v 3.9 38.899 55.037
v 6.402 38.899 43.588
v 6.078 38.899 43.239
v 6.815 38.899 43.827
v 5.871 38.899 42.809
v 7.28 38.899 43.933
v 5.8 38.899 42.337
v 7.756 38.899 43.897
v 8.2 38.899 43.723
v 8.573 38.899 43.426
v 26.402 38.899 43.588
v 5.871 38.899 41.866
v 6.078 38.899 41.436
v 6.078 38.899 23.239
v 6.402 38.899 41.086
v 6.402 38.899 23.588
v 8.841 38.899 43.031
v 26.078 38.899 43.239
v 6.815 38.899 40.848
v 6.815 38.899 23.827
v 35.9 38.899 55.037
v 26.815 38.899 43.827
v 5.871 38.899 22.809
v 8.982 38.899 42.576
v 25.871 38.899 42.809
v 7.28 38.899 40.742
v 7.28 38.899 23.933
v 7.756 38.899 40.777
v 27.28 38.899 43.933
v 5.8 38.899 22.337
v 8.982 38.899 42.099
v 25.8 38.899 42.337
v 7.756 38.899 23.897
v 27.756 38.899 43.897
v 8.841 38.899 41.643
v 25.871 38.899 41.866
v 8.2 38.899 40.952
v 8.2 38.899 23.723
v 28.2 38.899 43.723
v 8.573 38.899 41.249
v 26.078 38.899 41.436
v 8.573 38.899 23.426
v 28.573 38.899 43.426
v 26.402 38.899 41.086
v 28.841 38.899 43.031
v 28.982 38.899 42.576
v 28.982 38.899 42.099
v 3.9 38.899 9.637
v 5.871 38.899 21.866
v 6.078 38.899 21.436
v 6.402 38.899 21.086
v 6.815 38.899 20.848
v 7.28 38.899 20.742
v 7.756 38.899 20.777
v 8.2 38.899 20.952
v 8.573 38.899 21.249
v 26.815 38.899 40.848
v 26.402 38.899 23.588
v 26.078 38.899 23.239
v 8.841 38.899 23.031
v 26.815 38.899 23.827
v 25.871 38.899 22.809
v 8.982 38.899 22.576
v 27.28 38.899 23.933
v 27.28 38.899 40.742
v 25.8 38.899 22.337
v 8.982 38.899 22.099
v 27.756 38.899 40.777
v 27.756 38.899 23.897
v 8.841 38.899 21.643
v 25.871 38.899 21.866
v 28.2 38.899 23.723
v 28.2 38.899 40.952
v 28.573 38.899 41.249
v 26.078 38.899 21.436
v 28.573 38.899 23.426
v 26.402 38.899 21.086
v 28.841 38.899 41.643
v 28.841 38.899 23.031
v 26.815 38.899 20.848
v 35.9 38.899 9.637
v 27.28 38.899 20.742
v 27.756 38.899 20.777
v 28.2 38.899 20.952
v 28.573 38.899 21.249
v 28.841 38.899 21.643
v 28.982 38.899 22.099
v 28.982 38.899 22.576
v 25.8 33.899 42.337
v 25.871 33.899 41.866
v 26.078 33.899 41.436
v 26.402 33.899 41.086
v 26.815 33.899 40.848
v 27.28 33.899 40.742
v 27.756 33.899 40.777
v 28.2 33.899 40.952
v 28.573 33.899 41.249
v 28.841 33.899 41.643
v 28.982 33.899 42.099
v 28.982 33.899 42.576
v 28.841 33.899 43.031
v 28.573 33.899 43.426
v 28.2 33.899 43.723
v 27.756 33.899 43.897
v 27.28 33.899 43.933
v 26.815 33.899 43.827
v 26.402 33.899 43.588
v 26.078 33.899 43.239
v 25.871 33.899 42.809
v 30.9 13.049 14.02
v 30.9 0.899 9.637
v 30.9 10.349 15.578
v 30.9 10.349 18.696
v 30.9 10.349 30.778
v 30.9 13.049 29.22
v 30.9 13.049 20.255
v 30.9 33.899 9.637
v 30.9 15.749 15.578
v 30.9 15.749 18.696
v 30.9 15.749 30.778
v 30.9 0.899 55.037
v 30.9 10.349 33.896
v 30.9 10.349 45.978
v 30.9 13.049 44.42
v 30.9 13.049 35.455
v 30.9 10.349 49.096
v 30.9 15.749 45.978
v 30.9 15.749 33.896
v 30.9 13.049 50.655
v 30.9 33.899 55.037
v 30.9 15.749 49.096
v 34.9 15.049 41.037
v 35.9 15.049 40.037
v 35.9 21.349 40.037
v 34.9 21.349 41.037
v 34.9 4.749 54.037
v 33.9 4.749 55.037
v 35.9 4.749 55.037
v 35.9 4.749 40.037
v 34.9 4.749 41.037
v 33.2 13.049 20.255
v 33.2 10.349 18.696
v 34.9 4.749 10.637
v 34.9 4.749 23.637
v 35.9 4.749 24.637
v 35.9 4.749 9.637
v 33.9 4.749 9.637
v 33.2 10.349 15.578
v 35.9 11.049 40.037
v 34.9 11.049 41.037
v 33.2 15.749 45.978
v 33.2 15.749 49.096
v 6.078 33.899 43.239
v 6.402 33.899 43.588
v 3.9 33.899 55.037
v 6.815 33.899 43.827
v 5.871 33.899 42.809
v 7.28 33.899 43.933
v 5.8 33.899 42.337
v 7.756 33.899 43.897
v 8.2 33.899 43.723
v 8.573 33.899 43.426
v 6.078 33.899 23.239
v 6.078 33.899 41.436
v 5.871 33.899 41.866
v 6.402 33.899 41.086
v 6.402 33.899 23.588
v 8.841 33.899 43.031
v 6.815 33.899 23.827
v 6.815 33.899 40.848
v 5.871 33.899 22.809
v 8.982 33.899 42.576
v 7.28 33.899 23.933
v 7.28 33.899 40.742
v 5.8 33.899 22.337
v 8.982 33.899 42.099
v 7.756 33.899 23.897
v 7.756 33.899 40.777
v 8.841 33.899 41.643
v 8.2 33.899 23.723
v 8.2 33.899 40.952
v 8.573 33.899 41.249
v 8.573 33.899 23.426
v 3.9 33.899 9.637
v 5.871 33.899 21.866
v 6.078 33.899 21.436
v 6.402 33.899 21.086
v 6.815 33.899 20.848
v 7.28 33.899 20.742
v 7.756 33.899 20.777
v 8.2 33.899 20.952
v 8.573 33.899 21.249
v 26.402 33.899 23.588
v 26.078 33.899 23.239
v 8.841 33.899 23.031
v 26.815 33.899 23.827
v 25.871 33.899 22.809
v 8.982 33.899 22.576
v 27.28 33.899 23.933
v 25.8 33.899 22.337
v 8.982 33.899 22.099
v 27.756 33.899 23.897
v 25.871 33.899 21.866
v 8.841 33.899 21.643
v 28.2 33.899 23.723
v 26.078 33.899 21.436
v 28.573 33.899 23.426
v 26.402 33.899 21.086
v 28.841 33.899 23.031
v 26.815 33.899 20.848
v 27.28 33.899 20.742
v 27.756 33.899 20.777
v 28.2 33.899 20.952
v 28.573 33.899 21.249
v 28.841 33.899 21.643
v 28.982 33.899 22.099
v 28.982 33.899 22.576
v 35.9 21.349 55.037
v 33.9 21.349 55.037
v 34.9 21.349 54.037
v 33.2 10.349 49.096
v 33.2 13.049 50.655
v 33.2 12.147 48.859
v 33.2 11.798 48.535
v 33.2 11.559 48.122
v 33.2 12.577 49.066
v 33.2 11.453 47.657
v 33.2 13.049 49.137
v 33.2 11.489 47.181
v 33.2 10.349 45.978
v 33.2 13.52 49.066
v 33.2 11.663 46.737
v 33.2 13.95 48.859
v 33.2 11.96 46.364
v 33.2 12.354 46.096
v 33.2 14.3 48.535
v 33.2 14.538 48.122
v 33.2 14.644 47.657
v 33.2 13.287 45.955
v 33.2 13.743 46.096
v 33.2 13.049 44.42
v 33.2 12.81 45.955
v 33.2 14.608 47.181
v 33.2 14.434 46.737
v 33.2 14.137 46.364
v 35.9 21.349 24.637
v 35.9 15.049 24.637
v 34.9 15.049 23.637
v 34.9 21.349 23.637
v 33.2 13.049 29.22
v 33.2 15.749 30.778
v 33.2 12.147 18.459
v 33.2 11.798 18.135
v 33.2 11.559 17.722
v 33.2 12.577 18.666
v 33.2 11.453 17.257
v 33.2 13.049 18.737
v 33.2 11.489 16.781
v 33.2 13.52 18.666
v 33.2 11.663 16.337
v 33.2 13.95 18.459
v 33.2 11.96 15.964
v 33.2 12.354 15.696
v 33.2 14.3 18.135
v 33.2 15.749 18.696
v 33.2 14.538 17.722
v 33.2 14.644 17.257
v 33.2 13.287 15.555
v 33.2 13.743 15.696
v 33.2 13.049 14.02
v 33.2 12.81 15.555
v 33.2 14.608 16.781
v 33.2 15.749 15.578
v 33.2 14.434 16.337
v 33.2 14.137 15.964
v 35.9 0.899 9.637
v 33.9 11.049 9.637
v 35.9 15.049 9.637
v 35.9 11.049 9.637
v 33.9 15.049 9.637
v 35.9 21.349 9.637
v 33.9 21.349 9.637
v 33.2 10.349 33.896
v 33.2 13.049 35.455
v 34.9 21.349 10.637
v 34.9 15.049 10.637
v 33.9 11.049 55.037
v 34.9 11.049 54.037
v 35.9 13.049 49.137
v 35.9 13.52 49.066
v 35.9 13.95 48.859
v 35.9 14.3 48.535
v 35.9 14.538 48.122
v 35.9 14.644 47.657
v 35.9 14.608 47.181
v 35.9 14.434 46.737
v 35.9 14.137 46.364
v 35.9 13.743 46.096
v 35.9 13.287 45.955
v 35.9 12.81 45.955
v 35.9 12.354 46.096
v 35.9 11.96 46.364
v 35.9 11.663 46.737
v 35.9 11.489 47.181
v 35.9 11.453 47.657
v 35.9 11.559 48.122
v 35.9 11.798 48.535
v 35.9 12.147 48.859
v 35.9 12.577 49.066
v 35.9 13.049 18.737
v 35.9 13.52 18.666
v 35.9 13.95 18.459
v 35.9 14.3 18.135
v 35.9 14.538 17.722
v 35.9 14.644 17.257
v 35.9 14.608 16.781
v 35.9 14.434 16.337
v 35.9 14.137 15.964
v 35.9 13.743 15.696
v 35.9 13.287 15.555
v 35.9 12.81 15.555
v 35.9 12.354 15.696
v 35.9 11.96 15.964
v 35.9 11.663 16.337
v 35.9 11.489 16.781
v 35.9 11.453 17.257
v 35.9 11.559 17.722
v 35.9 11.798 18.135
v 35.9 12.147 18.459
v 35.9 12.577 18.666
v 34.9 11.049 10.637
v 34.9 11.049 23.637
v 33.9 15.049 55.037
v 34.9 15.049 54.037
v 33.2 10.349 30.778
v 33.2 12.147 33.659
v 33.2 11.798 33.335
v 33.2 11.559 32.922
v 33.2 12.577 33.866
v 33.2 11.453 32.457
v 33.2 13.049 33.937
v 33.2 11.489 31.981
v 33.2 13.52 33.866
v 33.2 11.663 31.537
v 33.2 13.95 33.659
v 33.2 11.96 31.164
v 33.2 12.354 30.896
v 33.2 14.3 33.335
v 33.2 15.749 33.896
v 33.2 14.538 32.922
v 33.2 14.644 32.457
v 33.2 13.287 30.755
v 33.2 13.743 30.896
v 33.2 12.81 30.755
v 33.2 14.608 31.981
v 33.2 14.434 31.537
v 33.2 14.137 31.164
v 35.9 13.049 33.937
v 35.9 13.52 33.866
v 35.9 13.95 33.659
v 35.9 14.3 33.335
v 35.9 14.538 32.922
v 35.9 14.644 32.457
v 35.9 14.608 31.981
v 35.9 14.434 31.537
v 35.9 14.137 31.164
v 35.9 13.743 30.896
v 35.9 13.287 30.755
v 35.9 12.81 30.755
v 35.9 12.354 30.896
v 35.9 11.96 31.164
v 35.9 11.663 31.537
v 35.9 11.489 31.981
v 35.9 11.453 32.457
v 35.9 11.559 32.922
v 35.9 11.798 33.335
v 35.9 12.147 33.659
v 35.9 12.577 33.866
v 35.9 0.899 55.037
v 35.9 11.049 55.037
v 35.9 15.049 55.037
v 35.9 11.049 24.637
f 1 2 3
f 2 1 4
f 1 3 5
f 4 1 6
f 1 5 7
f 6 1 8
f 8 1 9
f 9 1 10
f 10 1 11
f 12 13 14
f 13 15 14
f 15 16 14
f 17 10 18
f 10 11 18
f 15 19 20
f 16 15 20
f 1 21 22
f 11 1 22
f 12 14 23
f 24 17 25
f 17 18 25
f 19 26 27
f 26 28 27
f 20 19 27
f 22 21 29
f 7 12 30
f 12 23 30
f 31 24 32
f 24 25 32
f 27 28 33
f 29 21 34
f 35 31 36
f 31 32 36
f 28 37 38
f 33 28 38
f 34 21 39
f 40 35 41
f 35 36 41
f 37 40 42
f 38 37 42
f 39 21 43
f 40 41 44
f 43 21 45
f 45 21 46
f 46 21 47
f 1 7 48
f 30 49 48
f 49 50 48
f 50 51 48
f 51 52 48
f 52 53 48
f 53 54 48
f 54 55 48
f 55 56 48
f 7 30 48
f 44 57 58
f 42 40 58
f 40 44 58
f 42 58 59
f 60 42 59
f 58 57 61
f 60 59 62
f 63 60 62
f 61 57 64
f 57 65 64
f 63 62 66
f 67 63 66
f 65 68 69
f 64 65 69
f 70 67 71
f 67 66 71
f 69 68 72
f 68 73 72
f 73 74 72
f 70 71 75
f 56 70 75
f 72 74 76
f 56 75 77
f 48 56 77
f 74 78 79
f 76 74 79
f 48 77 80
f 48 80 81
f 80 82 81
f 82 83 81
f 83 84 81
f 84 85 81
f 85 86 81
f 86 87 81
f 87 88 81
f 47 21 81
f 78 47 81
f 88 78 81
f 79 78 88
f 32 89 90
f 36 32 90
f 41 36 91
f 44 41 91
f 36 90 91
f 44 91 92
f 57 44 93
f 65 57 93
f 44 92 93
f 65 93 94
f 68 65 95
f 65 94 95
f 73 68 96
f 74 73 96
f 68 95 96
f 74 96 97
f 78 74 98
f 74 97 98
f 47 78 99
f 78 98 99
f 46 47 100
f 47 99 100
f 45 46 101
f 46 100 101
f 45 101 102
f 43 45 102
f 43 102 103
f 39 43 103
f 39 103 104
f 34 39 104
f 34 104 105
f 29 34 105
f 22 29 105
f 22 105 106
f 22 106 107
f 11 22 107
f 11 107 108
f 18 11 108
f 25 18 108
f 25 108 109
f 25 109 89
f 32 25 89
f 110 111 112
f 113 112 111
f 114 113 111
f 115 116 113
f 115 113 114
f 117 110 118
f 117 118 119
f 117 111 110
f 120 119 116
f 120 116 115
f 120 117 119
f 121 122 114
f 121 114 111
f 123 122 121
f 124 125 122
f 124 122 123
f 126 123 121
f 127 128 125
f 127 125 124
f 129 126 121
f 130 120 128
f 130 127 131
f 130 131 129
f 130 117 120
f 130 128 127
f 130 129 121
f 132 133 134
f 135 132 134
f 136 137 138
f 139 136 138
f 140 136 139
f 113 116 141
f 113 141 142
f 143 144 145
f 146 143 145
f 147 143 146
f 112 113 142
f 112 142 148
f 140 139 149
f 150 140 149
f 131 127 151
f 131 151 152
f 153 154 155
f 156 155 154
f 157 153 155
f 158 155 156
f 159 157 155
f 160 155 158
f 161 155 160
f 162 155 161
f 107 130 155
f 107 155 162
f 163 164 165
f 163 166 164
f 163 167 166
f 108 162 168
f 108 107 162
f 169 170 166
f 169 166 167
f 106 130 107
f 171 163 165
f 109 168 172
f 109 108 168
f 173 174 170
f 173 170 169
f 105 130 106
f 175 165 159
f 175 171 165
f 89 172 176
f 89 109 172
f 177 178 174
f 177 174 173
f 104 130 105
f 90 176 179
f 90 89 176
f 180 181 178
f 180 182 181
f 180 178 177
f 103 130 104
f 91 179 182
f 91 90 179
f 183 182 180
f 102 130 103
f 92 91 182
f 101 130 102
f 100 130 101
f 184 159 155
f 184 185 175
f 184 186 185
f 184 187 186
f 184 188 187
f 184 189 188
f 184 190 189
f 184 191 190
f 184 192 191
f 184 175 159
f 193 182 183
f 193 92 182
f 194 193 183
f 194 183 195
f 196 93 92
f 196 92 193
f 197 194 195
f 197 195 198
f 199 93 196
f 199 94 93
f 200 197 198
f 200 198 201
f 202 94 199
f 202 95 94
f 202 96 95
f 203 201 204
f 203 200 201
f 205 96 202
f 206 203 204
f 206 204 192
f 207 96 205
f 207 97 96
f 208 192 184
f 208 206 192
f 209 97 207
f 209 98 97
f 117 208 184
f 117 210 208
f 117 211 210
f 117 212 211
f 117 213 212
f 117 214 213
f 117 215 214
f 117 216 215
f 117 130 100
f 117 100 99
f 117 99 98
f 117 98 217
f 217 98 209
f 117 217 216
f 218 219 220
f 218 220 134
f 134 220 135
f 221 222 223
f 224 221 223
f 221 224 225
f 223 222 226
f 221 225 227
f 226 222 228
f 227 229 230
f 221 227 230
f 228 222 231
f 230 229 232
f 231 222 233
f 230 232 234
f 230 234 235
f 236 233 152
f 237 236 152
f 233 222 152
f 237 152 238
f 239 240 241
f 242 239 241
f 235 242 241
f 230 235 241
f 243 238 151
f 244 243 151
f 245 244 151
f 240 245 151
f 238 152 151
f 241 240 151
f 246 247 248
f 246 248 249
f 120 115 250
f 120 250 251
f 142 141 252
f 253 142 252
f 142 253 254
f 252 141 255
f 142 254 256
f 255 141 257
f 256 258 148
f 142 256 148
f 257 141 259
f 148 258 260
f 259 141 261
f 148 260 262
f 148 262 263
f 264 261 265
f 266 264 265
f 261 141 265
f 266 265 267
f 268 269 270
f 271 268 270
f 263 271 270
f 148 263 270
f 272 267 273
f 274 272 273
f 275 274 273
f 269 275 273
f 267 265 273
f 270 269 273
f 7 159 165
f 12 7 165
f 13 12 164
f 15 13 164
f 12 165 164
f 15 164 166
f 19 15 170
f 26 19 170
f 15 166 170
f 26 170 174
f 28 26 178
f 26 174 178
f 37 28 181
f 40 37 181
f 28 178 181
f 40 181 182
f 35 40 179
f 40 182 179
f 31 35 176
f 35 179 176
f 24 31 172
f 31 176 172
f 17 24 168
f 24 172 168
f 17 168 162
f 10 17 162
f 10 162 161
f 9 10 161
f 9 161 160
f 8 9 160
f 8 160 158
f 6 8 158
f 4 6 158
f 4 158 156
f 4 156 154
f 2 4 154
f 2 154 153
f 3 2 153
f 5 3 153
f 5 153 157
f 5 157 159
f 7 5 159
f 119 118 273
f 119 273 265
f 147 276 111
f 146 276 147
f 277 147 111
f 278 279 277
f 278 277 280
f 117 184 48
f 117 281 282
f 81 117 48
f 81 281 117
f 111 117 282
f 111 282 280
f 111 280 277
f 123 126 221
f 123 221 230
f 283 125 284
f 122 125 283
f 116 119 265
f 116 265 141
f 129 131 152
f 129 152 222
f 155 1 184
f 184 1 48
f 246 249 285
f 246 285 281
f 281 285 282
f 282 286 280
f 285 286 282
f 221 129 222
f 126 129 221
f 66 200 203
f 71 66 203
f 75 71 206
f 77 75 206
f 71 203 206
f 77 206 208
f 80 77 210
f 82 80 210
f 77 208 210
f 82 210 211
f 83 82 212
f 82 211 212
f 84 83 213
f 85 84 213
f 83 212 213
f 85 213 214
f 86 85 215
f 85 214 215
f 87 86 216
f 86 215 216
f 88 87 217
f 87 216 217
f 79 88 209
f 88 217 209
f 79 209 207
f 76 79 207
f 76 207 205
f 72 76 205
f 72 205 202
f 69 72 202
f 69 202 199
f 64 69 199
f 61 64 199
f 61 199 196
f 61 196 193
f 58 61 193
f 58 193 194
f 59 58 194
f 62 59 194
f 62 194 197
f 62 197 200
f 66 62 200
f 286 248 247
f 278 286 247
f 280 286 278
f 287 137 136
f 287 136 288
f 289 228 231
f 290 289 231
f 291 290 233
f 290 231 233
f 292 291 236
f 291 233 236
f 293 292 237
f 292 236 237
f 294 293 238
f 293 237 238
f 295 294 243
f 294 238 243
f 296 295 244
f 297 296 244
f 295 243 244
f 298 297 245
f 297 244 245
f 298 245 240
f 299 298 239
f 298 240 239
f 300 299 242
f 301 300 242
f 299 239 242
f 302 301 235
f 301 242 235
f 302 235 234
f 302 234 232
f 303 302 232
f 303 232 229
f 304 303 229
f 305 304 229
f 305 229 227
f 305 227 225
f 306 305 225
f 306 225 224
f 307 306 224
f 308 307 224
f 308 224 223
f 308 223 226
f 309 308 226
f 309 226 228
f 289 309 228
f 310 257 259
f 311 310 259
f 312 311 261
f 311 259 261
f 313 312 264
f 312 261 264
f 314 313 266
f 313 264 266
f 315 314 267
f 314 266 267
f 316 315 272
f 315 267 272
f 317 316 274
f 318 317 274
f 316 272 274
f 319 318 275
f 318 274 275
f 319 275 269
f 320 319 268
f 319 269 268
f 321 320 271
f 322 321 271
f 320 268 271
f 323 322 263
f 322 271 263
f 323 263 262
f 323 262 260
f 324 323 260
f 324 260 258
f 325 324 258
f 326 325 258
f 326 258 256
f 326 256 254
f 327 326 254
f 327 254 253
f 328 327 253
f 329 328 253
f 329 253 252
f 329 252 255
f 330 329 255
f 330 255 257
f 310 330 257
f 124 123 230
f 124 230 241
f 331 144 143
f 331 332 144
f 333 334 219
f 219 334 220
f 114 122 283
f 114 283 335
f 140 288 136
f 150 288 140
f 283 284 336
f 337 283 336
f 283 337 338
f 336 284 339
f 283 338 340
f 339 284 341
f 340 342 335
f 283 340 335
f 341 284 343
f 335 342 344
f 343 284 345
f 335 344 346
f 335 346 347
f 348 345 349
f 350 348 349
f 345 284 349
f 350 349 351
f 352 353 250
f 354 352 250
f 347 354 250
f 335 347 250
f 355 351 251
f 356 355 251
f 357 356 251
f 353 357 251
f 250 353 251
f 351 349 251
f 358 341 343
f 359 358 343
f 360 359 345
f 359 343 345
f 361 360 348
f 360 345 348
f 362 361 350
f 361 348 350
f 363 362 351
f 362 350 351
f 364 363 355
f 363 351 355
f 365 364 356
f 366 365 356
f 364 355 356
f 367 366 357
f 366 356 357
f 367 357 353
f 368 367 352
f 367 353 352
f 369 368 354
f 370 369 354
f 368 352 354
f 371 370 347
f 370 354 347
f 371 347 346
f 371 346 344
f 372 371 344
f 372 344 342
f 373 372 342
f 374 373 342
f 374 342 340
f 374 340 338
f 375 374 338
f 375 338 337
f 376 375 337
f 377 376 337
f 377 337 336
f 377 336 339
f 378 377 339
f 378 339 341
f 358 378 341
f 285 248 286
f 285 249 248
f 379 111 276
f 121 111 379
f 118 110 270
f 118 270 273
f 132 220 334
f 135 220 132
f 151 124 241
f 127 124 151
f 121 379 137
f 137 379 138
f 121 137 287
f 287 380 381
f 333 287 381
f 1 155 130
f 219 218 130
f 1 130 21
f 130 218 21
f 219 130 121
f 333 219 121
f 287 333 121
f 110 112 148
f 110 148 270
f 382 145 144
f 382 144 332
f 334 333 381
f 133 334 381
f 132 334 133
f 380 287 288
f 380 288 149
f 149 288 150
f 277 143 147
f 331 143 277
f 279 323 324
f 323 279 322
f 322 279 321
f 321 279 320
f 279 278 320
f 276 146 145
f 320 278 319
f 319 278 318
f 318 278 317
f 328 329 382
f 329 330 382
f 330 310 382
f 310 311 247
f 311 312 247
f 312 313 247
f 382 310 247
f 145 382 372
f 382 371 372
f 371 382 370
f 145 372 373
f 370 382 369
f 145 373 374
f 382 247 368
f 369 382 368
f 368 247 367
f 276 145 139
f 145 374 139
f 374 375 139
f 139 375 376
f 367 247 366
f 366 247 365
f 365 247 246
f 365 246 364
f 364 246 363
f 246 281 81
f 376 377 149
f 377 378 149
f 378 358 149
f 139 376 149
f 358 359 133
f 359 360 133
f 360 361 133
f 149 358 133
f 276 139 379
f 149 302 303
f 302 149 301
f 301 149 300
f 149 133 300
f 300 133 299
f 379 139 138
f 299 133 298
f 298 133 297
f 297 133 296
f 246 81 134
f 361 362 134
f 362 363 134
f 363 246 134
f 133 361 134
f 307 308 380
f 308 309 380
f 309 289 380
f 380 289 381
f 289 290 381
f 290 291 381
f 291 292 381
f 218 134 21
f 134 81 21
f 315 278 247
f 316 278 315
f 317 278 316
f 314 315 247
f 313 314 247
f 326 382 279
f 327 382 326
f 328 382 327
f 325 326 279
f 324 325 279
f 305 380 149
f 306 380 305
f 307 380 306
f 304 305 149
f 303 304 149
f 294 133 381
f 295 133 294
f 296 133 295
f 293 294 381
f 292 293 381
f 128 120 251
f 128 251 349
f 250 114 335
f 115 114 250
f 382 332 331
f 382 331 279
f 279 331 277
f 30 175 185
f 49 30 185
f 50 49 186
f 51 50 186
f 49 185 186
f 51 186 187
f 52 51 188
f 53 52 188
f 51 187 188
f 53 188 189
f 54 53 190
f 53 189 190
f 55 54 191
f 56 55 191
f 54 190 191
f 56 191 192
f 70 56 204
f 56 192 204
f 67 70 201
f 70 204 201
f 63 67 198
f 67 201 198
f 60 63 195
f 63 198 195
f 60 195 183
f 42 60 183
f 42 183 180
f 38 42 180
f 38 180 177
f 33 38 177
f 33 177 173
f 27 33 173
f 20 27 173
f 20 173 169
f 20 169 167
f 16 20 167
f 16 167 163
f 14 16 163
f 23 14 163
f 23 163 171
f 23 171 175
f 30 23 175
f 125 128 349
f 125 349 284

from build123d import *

# Parameters (mm, degrees)
MAIN_BLOCK_DEPTH                 = 5
BELT_START                       = -1
BELT_CLAMP_CUTOUT_SKETCH_W       = 15
BELT_CLAMP_CUTOUT_SKETCH_H       = 6.3
BELT_CLAMP_CUTOUT_DEPTH          = 1
BELT_CLAMP_SCREW_HOLES_D         = 3.2
BELT_CLAMP_SCREW_NUT_TRAPS_DEPTH = 2.3
BELT_GUIDE_CHAMFERS_SIZE         = 1
RAIL_MOUNT_BLOCK_SKETCH_W        = 45.4
RAIL_MOUNT_BLOCK_SKETCH_H        = 5
CARRIAGE_MOUNTING_BLOCK_DEPTH    = 27
CARRIAGE_MOUNTING_HOLES_D        = 3.2


with BuildPart() as part:
    # Main Block Sketch → Main Block (new body)
    with BuildSketch(Plane(origin=(30.899718474, 0, 0), x_dir=(0, 0, -1), z_dir=(1, 0, 0))):
        Polygon((-55.037241551, 38.898583536), (-9.637241551, 38.898583536), (-9.637241551, 33.898583536), (-9.637241551, 0.898583536), (-55.037241551, 0.898583536), (-55.037241551, 33.898583536), align=None)
    extrude(amount=MAIN_BLOCK_DEPTH)

    # Belt Clamp Cutout Sketch → Belt Clamp Cutout (cut)
    with BuildSketch(Plane(origin=(35.899718474, 0, 0), x_dir=(0, 0, -1), z_dir=(1, 0, 0)).offset(BELT_START)):
        with Locations((-47.537241551, 7.898583536)):
            Rectangle(BELT_CLAMP_CUTOUT_SKETCH_W, BELT_CLAMP_CUTOUT_SKETCH_H)
        with Locations((-17.137241551, 7.898583536)):
            Rectangle(BELT_CLAMP_CUTOUT_SKETCH_W, BELT_CLAMP_CUTOUT_SKETCH_H)
        with Locations((-17.137241551, 18.198583536)):
            Rectangle(BELT_CLAMP_CUTOUT_SKETCH_W, BELT_CLAMP_CUTOUT_SKETCH_H)
        with Locations((-47.537241551, 18.198583536)):
            Rectangle(BELT_CLAMP_CUTOUT_SKETCH_W, BELT_CLAMP_CUTOUT_SKETCH_H)
    extrude(amount=BELT_CLAMP_CUTOUT_DEPTH, mode=Mode.SUBTRACT)

    # Belt Clamp Screw Holes (through all)
    with Locations(Plane(origin=(35.899718474, 0, 0), x_dir=(0, 0, -1), z_dir=(1, 0, 0))):
        with Locations((-47.537241551, 13.048583536), (-17.137241551, 13.048583536), (-32.337241551, 13.048583536)):
            Hole(BELT_CLAMP_SCREW_HOLES_D / 2)

    # Nut Trap Sketch → Belt Clamp Screw Nut Traps (cut)
    with BuildSketch(Plane(origin=(30.899718474, 0, 0), x_dir=(0, 0, -1), z_dir=(1, 0, 0))):
        Polygon((-45.978395824, 15.748583536), (-49.096087278, 15.748583536), (-50.654933005, 13.048583536), (-49.096087278, 10.348583536), (-45.978395824, 10.348583536), (-44.419550097, 13.048583536), align=None)
        Polygon((-30.778395824, 15.748583536), (-33.896087278, 15.748583536), (-35.454933005, 13.048583536), (-33.896087278, 10.348583536), (-30.778395824, 10.348583536), (-29.219550097, 13.048583536), align=None)
        Polygon((-15.578395824, 15.748583536), (-18.696087278, 15.748583536), (-20.254933005, 13.048583536), (-18.696087278, 10.348583536), (-15.578395824, 10.348583536), (-14.019550097, 13.048583536), align=None)
    extrude(amount=BELT_CLAMP_SCREW_NUT_TRAPS_DEPTH, mode=Mode.SUBTRACT)

    # Belt Guide Chamfers
    belt_guide_chamfers_edges = [part.edges().sort_by_distance(p)[0] for p in [
        (34.899718474, 7.898583536, 40.037241551),
        (34.899718474, 18.198583536, 40.037241551),
        (34.899718474, 7.898583536, 24.637241551),
        (34.899718474, 18.198583536, 24.637241551),
    ]]
    chamfer(belt_guide_chamfers_edges, length=BELT_GUIDE_CHAMFERS_SIZE - 0.0001)  # a hair under: the kernel refuses the full size
    belt_guide_chamfers_2_edges = [part.edges().sort_by_distance(p)[0] for p in [
        (34.899718474, 18.198583536, 55.037241551),
        (34.899718474, 7.898583536, 55.037241551),
        (34.899718474, 7.898583536, 9.637241551),
        (34.899718474, 18.198583536, 9.637241551),
    ]]
    chamfer(belt_guide_chamfers_2_edges, length=BELT_GUIDE_CHAMFERS_SIZE)

    # Rail Mount Block Sketch → Carriage Mounting Block (add)
    with BuildSketch(Plane(origin=(30.899718474, 0, 0), x_dir=(0, 0, -1), z_dir=(1, 0, 0))):
        with Locations((-32.337241551, 36.398583536)):
            Rectangle(RAIL_MOUNT_BLOCK_SKETCH_W, RAIL_MOUNT_BLOCK_SKETCH_H)
    extrude(amount=-CARRIAGE_MOUNTING_BLOCK_DEPTH)

    # Carriage Mounting Holes (through all)
    with Locations(Plane(origin=(0, 38.898583536, 0), x_dir=(1, 0, 0), z_dir=(0, 1, 0))):
        with Locations((7.399718474, -42.337241551), (27.399718474, -42.337241551), (7.399718474, -22.337241551), (27.399718474, -22.337241551)):
            Hole(CARRIAGE_MOUNTING_HOLES_D / 2)


solid = part.part
